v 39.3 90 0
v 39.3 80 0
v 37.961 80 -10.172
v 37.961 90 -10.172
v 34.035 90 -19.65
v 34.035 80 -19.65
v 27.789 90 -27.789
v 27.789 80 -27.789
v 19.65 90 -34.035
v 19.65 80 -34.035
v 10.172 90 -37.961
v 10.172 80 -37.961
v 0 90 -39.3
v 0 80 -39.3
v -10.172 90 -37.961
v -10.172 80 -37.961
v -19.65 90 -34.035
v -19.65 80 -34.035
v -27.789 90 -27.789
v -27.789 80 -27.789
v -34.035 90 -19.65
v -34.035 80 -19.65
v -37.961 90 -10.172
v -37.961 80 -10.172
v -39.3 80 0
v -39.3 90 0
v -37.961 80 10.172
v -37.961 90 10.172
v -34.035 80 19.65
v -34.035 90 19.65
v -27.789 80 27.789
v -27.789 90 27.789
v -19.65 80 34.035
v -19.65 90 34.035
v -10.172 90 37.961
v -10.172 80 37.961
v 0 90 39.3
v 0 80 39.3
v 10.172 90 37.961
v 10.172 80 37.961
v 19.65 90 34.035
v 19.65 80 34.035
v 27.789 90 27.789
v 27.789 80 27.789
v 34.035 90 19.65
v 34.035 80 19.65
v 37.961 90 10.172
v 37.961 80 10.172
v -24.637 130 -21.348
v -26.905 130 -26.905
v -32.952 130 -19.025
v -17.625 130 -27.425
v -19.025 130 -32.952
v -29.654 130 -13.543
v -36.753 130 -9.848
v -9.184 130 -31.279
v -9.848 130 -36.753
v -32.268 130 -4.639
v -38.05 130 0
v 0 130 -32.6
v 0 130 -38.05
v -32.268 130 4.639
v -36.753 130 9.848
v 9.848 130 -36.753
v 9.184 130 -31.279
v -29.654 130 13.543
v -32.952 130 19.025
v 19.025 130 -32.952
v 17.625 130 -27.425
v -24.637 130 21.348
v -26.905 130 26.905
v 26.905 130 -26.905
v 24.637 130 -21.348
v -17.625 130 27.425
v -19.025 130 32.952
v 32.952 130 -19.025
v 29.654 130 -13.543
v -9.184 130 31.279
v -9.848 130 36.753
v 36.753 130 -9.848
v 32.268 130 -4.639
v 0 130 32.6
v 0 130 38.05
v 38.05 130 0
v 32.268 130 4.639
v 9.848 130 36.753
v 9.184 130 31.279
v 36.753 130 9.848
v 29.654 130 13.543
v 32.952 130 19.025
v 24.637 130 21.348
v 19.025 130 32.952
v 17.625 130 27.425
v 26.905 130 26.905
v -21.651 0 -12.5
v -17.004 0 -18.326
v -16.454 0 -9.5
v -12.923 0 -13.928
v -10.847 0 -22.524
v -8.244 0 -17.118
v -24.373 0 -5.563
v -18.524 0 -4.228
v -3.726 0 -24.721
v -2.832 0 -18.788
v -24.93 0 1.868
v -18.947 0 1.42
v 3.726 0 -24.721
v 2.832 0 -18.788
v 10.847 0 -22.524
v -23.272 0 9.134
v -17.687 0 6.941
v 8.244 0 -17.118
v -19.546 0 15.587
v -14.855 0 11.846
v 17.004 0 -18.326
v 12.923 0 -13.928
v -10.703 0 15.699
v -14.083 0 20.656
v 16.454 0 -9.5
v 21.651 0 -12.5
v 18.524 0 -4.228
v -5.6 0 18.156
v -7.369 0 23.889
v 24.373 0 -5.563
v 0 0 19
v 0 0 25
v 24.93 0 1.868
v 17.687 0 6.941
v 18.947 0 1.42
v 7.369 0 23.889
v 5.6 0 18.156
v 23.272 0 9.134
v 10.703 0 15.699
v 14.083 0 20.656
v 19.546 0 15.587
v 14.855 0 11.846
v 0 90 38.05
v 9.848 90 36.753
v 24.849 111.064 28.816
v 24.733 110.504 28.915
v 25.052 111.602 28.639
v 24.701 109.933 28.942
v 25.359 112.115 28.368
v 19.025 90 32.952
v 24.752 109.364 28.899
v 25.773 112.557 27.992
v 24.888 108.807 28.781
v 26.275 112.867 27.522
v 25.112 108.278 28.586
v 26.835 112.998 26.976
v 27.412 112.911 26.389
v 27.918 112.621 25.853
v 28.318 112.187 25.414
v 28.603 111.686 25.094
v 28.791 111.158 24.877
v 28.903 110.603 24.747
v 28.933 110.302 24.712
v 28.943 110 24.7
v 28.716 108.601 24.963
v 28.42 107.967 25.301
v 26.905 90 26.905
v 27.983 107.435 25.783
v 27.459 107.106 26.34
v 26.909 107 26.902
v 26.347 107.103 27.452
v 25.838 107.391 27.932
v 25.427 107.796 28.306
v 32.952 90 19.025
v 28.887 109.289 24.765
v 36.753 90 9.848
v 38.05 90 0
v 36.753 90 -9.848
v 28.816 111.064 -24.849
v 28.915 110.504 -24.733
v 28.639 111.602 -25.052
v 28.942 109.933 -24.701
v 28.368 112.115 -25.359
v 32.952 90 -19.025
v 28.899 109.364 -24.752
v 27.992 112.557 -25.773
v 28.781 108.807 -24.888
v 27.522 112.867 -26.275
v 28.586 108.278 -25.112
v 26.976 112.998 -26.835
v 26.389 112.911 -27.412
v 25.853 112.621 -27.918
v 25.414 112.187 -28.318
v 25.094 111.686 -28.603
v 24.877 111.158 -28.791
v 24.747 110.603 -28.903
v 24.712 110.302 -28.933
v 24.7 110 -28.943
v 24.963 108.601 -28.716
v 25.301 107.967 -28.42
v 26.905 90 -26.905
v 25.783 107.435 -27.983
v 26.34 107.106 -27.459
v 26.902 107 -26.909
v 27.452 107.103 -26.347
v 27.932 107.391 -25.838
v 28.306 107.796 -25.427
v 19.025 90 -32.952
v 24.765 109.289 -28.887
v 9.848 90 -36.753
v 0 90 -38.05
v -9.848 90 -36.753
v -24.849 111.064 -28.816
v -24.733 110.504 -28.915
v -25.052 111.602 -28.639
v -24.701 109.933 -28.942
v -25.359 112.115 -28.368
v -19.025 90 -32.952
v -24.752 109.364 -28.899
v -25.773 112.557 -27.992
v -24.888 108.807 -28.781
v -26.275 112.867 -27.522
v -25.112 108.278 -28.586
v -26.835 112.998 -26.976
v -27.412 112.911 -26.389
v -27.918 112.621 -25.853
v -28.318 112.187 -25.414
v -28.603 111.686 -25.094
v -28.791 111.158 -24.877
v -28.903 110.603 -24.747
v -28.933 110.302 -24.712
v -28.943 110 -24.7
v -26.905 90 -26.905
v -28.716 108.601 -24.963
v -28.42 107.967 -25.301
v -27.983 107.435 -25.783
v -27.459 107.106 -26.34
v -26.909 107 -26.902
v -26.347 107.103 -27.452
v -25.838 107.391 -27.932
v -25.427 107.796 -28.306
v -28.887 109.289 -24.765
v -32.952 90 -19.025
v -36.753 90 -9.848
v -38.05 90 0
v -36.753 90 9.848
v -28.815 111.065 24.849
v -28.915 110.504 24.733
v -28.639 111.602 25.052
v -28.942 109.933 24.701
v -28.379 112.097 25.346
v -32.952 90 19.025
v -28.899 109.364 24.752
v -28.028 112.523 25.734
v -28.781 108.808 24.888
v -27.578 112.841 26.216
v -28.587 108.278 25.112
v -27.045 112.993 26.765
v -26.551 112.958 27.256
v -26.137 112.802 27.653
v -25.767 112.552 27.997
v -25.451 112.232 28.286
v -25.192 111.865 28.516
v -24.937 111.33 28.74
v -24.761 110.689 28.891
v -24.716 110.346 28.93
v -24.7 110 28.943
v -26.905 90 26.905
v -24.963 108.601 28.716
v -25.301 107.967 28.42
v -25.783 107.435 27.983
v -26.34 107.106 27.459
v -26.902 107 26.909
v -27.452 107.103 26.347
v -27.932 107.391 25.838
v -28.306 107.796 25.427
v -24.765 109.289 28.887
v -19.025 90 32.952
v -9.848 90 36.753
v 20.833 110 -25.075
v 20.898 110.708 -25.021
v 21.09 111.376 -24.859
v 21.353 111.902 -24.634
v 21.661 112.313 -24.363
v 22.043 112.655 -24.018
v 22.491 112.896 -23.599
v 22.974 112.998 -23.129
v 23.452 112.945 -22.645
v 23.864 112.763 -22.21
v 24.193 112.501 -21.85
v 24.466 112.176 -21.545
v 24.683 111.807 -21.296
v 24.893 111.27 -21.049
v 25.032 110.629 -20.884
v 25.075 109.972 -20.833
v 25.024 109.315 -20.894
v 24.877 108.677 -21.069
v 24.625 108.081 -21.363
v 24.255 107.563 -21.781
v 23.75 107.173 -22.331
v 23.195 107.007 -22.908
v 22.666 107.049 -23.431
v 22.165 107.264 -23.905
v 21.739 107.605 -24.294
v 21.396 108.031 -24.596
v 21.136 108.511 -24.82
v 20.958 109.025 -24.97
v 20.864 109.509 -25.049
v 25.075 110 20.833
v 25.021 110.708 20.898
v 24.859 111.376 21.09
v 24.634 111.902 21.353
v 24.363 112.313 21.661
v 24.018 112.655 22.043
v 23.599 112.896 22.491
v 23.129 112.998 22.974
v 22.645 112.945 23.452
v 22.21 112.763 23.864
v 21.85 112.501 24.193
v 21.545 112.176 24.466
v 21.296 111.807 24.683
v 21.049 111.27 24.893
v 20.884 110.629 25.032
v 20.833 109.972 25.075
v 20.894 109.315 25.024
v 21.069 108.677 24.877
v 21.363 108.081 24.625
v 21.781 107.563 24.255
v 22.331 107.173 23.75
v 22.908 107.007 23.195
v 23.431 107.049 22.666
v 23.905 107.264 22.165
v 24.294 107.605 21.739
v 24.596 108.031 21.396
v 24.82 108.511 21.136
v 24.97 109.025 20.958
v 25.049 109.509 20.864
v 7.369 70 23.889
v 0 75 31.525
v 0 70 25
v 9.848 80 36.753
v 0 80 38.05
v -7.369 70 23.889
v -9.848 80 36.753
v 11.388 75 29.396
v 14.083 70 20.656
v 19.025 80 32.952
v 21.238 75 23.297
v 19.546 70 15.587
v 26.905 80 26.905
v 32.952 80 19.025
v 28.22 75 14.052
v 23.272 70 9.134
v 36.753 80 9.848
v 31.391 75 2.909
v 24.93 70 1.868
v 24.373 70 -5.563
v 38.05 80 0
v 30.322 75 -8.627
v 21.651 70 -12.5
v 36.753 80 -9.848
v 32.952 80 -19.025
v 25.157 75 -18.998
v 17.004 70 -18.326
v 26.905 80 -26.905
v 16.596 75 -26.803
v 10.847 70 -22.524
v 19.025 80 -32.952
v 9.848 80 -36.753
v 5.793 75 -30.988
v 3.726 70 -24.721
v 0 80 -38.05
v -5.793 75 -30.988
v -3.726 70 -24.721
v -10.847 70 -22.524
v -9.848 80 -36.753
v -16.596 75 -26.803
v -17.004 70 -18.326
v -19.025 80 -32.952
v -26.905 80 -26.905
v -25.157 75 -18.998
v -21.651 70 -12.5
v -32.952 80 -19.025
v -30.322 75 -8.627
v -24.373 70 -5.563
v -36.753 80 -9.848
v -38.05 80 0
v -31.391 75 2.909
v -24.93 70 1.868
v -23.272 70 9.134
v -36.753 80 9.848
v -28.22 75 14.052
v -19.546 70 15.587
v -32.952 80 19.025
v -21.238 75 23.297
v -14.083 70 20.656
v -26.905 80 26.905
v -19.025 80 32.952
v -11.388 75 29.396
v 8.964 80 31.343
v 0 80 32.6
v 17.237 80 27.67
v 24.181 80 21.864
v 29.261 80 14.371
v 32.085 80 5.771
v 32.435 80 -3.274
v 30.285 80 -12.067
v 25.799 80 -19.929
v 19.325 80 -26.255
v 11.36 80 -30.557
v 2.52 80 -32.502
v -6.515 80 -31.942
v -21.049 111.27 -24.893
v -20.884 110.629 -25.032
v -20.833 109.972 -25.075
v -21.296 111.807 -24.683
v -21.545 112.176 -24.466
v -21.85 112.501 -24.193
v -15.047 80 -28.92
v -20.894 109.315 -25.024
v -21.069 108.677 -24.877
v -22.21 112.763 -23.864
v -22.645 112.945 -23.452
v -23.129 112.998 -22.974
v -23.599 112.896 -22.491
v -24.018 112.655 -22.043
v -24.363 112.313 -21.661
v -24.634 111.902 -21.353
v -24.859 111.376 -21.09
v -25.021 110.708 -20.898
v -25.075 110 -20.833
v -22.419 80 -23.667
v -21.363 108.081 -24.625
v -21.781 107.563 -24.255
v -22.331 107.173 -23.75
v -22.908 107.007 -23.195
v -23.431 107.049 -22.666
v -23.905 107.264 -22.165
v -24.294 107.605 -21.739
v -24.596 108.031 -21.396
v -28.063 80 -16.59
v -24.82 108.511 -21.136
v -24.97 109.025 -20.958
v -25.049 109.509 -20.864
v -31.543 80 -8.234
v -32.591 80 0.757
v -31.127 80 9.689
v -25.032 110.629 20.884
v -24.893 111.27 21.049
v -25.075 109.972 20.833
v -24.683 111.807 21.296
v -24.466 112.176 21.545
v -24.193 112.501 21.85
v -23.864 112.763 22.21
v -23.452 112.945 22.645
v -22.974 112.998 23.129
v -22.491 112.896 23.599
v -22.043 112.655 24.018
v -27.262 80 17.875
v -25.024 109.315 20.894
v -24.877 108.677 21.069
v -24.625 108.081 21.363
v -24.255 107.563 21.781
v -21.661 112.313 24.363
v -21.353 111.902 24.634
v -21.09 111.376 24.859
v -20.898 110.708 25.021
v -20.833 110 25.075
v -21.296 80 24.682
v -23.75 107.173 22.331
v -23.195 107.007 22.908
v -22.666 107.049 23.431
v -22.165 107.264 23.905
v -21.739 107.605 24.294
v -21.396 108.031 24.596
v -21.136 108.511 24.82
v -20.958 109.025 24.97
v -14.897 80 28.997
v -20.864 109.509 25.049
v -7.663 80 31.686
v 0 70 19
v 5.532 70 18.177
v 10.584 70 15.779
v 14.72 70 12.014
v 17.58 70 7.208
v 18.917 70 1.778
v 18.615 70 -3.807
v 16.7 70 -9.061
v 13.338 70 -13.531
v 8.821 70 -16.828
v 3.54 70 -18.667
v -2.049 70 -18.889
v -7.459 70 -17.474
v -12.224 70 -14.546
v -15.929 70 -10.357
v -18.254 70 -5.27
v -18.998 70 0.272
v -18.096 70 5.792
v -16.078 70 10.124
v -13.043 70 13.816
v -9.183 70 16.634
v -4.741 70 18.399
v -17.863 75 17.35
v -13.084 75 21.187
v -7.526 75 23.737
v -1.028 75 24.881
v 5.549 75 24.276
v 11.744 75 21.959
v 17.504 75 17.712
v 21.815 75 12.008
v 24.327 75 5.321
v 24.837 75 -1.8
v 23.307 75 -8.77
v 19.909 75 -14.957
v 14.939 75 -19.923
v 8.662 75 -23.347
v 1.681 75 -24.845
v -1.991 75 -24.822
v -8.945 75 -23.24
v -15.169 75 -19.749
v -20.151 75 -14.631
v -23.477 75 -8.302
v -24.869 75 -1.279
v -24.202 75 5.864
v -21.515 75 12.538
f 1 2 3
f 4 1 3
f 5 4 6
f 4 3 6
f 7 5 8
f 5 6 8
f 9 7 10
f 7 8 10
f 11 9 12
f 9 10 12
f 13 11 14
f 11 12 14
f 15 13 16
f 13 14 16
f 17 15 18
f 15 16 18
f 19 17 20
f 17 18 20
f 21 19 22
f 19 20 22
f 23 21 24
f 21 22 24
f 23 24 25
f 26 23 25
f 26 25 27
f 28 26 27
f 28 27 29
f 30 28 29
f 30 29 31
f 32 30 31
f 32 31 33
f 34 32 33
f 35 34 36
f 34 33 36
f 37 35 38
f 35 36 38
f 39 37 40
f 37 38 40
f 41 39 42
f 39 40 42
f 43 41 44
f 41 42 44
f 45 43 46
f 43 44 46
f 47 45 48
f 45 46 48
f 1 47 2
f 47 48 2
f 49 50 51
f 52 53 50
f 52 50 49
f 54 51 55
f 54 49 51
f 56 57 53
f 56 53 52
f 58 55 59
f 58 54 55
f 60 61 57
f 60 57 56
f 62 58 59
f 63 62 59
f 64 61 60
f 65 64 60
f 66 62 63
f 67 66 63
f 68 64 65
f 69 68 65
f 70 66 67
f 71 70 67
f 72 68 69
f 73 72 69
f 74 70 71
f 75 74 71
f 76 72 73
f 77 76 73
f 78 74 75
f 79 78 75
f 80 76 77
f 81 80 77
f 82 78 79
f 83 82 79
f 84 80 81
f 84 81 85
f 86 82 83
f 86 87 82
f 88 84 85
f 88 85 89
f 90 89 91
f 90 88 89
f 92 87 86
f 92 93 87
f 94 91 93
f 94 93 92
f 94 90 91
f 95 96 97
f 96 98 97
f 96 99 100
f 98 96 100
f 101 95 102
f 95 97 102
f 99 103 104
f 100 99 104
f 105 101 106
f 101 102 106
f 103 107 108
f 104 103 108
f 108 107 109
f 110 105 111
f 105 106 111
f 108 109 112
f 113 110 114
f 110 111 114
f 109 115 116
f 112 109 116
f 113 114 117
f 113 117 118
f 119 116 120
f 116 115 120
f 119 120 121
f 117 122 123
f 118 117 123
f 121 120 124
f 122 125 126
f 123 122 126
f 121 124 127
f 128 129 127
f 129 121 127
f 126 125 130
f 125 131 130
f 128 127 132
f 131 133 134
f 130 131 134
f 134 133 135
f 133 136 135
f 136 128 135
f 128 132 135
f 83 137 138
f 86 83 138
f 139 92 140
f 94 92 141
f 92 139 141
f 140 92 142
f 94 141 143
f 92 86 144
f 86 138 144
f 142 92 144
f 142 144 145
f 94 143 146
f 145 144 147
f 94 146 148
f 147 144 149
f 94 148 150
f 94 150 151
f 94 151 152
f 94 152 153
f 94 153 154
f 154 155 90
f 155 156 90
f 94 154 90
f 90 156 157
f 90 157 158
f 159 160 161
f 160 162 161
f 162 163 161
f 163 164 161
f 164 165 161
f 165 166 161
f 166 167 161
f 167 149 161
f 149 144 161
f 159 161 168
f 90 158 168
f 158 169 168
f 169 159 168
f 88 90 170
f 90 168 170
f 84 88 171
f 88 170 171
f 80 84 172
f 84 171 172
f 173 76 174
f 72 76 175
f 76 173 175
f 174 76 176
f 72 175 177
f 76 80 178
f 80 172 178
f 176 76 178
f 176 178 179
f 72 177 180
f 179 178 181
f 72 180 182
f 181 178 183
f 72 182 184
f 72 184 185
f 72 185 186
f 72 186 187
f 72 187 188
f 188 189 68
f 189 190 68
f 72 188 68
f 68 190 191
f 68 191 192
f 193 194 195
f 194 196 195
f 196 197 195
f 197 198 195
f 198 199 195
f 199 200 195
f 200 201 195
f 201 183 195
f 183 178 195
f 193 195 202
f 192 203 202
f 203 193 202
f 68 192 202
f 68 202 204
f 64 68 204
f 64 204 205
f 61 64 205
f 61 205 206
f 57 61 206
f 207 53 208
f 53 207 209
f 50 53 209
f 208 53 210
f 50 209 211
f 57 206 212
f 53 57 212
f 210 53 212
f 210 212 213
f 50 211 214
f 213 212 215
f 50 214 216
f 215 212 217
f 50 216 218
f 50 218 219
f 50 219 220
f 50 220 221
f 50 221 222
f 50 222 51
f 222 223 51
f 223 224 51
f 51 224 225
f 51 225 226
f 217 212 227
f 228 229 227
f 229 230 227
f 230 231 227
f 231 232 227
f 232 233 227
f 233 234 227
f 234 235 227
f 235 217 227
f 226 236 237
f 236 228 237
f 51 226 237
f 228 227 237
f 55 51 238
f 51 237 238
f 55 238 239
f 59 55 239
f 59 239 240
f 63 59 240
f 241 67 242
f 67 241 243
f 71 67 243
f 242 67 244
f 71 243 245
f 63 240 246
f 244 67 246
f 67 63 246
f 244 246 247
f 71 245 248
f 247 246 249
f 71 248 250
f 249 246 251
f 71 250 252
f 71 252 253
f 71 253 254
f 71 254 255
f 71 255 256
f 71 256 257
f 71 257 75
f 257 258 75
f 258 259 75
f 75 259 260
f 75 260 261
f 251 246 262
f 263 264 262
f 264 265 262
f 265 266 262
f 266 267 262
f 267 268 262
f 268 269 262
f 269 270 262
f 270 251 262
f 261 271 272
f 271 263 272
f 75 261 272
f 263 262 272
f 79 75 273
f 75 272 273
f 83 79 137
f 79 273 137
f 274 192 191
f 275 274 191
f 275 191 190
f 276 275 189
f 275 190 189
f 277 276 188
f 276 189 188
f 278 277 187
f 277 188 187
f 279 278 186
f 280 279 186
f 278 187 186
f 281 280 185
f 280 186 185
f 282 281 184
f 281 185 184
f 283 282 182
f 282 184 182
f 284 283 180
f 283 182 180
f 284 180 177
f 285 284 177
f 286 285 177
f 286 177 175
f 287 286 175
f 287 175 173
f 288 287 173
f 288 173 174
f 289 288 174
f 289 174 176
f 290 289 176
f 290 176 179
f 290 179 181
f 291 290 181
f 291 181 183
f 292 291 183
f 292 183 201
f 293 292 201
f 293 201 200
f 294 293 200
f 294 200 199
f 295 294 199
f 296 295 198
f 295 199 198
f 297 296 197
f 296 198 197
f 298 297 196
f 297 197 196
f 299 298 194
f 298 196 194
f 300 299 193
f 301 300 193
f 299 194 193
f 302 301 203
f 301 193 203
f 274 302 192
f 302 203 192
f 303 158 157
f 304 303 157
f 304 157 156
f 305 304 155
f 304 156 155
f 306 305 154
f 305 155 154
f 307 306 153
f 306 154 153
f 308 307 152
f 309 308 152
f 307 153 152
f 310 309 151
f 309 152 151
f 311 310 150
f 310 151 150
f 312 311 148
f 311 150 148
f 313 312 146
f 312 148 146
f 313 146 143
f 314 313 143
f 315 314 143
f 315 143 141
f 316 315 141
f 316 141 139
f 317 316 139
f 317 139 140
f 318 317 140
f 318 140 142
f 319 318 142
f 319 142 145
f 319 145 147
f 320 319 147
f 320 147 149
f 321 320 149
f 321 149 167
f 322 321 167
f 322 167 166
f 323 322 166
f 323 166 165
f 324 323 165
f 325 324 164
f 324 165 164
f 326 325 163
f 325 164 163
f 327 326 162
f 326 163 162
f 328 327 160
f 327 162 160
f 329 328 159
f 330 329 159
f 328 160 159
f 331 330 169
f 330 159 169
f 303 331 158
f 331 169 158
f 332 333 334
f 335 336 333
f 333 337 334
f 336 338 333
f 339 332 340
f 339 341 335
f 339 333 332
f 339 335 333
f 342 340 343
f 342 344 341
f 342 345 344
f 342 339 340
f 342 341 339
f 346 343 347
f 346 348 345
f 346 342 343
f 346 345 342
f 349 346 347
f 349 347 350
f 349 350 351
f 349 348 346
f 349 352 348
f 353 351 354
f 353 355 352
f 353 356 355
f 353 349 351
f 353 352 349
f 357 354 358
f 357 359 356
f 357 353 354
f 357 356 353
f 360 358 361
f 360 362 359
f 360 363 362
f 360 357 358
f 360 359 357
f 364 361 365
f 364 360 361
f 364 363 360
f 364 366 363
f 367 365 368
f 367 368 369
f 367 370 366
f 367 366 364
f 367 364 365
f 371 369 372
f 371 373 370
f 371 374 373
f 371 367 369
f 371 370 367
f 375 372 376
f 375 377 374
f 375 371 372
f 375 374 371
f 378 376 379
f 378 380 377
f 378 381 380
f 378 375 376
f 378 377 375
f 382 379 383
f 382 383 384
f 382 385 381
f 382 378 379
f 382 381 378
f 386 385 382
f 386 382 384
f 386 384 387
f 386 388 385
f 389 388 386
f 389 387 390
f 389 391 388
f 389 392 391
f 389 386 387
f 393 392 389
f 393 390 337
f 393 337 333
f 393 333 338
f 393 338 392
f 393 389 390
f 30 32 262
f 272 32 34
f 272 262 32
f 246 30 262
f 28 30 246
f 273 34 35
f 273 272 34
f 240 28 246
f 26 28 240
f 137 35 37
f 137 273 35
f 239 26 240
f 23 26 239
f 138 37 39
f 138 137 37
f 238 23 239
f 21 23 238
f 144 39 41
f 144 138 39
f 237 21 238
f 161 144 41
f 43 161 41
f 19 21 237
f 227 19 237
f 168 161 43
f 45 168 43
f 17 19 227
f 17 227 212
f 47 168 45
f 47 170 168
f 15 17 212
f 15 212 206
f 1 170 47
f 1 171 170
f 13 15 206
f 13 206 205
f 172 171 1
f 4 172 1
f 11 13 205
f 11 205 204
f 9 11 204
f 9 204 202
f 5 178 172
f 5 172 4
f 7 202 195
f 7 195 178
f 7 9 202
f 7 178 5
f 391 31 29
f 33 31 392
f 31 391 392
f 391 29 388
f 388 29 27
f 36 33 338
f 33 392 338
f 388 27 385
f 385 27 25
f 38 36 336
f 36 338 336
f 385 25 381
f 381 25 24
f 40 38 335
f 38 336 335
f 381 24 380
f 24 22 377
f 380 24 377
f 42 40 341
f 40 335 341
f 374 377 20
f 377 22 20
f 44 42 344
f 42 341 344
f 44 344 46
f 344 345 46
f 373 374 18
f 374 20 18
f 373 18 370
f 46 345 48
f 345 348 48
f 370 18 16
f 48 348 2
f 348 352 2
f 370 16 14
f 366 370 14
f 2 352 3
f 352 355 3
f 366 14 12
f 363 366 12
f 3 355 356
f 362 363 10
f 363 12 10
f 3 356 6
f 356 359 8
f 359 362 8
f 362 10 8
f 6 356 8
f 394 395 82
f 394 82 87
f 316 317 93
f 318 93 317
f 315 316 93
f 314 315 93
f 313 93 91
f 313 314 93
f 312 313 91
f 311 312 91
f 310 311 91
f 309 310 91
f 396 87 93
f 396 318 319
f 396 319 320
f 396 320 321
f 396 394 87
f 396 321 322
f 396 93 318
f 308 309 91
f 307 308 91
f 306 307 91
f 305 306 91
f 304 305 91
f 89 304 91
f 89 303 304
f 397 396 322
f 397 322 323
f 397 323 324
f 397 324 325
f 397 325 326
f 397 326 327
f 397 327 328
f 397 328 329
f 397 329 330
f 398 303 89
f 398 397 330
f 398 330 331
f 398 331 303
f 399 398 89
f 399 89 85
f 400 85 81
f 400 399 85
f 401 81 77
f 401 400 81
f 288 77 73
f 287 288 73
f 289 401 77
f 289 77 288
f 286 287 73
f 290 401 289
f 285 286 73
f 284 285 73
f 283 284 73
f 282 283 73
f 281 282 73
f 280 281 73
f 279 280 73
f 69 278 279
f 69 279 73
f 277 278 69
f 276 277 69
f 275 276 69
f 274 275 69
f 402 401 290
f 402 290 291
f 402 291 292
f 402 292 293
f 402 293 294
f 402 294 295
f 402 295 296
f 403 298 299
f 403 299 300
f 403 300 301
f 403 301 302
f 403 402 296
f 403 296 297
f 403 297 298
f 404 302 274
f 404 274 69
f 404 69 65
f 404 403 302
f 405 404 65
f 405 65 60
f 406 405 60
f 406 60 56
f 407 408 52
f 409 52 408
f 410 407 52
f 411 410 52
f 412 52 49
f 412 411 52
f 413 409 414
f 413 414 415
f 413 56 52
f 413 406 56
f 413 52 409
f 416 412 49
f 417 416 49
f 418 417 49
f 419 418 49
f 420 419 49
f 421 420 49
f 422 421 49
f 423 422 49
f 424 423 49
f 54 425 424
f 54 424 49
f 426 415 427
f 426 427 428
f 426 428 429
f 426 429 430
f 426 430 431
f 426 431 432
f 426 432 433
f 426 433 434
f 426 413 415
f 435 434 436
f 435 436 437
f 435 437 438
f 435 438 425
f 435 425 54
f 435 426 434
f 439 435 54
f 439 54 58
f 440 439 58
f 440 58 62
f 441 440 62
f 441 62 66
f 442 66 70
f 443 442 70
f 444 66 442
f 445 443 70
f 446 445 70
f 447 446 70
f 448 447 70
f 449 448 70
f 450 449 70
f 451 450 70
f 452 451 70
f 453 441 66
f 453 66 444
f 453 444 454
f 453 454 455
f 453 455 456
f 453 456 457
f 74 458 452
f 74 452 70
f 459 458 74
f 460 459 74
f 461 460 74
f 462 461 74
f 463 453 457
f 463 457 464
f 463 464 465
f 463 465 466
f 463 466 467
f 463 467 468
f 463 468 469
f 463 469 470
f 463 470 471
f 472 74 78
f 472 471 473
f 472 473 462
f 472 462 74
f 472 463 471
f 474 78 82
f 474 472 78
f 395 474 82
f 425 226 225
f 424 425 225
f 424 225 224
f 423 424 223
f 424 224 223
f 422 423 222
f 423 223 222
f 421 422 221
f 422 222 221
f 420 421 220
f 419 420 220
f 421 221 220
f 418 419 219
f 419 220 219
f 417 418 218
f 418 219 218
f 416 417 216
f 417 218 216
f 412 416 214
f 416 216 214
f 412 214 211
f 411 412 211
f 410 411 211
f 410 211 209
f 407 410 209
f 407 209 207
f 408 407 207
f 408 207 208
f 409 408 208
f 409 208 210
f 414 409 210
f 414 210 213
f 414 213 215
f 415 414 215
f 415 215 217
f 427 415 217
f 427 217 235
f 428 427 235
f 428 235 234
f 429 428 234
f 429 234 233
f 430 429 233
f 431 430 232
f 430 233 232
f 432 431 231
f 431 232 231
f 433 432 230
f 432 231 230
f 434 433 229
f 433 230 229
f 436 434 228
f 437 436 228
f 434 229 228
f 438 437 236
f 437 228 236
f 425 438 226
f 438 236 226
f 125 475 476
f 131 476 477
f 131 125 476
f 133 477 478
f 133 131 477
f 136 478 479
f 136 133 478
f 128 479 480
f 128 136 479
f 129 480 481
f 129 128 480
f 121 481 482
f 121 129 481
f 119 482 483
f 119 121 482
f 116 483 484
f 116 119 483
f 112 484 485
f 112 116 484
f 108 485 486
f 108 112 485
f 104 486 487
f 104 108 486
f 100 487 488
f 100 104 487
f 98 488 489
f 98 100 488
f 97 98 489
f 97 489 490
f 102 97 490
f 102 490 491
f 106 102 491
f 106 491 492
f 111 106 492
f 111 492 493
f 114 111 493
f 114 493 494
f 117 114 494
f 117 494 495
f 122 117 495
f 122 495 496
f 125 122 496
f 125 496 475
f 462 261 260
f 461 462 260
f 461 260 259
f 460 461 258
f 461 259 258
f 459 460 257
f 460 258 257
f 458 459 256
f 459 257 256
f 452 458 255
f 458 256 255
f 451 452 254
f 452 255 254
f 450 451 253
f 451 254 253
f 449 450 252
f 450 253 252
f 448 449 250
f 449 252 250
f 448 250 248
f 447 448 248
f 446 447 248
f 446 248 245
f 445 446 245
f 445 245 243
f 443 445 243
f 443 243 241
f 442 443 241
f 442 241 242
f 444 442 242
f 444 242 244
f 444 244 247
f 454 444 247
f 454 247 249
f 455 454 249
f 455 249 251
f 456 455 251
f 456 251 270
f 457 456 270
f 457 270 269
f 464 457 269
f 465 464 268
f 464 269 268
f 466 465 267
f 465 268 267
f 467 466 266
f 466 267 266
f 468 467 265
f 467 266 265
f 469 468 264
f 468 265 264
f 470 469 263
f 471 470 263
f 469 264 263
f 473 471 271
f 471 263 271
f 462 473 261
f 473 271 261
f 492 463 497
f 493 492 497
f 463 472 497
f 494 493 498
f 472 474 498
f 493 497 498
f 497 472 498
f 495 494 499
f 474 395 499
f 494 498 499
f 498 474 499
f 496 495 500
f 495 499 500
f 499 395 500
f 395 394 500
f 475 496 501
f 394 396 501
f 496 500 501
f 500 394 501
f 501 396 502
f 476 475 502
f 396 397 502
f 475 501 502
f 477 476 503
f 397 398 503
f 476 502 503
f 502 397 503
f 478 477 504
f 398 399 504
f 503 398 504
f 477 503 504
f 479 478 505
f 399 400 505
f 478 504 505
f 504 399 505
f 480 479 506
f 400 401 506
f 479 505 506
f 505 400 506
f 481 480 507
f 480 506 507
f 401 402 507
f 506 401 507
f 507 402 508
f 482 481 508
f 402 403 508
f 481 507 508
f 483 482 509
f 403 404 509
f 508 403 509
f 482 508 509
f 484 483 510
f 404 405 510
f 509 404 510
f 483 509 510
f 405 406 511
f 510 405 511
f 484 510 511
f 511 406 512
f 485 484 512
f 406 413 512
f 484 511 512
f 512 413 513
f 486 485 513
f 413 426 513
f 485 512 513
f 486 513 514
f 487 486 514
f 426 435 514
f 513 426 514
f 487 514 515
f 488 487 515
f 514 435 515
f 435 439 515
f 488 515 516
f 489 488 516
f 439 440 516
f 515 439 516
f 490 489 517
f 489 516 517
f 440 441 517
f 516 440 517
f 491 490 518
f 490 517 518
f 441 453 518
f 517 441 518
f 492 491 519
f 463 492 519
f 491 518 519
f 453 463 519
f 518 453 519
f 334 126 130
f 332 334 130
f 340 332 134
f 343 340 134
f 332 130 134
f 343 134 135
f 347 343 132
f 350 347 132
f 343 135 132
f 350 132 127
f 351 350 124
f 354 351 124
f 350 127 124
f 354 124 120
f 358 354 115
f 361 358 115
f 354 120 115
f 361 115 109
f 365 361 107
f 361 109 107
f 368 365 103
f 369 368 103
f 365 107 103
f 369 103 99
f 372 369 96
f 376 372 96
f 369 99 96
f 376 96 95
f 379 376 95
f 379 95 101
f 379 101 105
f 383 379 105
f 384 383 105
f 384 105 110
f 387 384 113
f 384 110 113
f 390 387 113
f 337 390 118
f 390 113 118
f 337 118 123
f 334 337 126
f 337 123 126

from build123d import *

# Parameters (mm, degrees)
SKETCH2_R                 = 25
SKETCH2_R_2               = 19
BOSS_EXTRUDE1_DEPTH       = 70
BOSS_EXTRUDE2_START       = 10
SKETCH3_R                 = 38.05
SKETCH3_R_2               = 32.6
BOSS_EXTRUDE2_DEPTH       = 50
BOSS_EXTRUDE3_START       = -50
BOSS_EXTRUDE3_OUTLINE_R   = 39.3
BOSS_EXTRUDE3_OUTLINE_R_2 = 38.05
BOSS_EXTRUDE3_DEPTH       = 10
CUT_EXTRUDE1_REACH        = 162.207
CUT_EXTRUDE1_END_RADIUS   = 32.6
SKETCH7_R                 = 3
CIRPATTERN1_COUNT         = 4


with BuildPart() as part:
    # Sketch2 → Boss-Extrude1 (new body)
    with BuildSketch(Plane(origin=(0, 0, 0), x_dir=(1, 0, 0), z_dir=(0, 1, 0))):
        with Locations(Location((0, 0, 0), (0, 0, 270))):
            Circle(SKETCH2_R)
        with Locations(Location((0, 0, 0), (0, 0, 270))):
            Circle(SKETCH2_R_2, mode=Mode.SUBTRACT)
    extrude(amount=BOSS_EXTRUDE1_DEPTH)



with BuildPart() as body_2:
    # Sketch3 → Boss-Extrude2 (new body)
    with BuildSketch(Plane(origin=(0, 70, 0), x_dir=(1, 0, 0), z_dir=(0, 1, 0)).offset(BOSS_EXTRUDE2_START)):
        with Locations(Location((0, 0, 0), (0, 0, 270))):
            Circle(SKETCH3_R)
        with Locations(Location((0, 0, 0), (0, 0, 270))):
            Circle(SKETCH3_R_2, mode=Mode.SUBTRACT)
    extrude(amount=BOSS_EXTRUDE2_DEPTH)


with BuildPart() as part_1:
    add(part.part)

    add(body_2.part)  # loft3 joins it to this body
    # loft up to a face of the part (loft3)
    loft([Face(Wire([part_1.edges().sort_by_distance((18.224215686, 70, -17.113677648))[0]])), Face(Wire([part_1.edges().sort_by_distance((-27.737256273, 80, -26.047017381))[0]]))])

    # Cut-Loft1: read off the stored shape, not the designer's step
    # Cut-Loft1: loft between two sections, ruled curve by curve
    cut_loft1_from = [
        Edge.make_bspline([(-18.095722376, 70, 5.791790025), (-6.512142325, 70, 41.983234777), (29.679302426, 70, 30.399654727), (18.095722376, 70, -5.791790025), (6.512142325, 70, -41.983234777), (-29.679302426, 70, -30.399654727), (-18.095722376, 70, 5.791790025)], [0, 0, 0, 0, 0.5, 0.5, 0.5, 1, 1, 1, 1], 3, [1, 0.333333333, 0.333333333, 1, 0.333333333, 0.333333333, 1]),
    ]
    cut_loft1_to = [
        Edge.make_bspline([(-21.296342667, 80, 24.682499651), (28.068656636, 80, 67.275184984), (70.661341969, 80, 17.910185682), (21.296342667, 80, -24.682499651), (-28.068656636, 80, -67.275184984), (-70.661341969, 80, -17.910185682), (-21.296342667, 80, 24.682499651)], [0, 0, 0, 0, 0.5, 0.5, 0.5, 1, 1, 1, 1], 3, [1, 0.333333333, 0.333333333, 1, 0.333333333, 0.333333333, 1]),
    ]
    cut_loft1 = Solid(Shell([*[Face.make_surface_from_curves(cut_loft1_from[k], cut_loft1_to[k]) for k in range(1)], Face(Wire(cut_loft1_from)), Face(Wire(cut_loft1_to))]))
    add(cut_loft1, mode=Mode.SUBTRACT)

    # Boss-Extrude3: read off the stored shape, not the designer's step
    # Boss-Extrude3 outline → Boss-Extrude3 (add)
    with BuildSketch(Plane(origin=(0, 130, 0), x_dir=(1, 0, 0), z_dir=(0, 1, 0)).offset(BOSS_EXTRUDE3_START)):
        Circle(BOSS_EXTRUDE3_OUTLINE_R)
        Circle(BOSS_EXTRUDE3_OUTLINE_R_2, mode=Mode.SUBTRACT)
    extrude(amount=BOSS_EXTRUDE3_DEPTH)

    # Cut-Extrude1: up to this cylinder (the profile starts outside it)
    cut_extrude1_end = Plane(origin=(0, 110, 0), z_dir=(0, -1, 0)) * Cylinder(CUT_EXTRUDE1_END_RADIUS, 390.614, mode=Mode.PRIVATE)
    # Sketch7 → Cut-Extrude1 (cut, up to the surface)
    with BuildSketch(Plane(origin=(-26.905413024, 0, 26.905413024), x_dir=(0, -1, 0), z_dir=(-0.7071067811865488, 0, 0.7071067811865464)), mode=Mode.PRIVATE) as cut_extrude1_sk1:
        with Locations(Location((-110, 0, 0), (0, 0, 90))):
            Circle(SKETCH7_R)
    cut_extrude1_tool1 = extrude(cut_extrude1_sk1.sketch, amount=-CUT_EXTRUDE1_REACH, mode=Mode.PRIVATE) - cut_extrude1_end
    cut_extrude1 = cut_extrude1_tool1.solids().sort_by_distance((-26.905413, 110, 26.905413))[0]
    add(cut_extrude1, mode=Mode.SUBTRACT)

    # CirPattern1: Cut-Extrude1 ×4 about axis
    cirpattern1_axis = Axis((0, 130, 0), (0, -1, 0))
    for i in range(1, CIRPATTERN1_COUNT):
        add(cut_extrude1.rotate(cirpattern1_axis, i * 360 / CIRPATTERN1_COUNT), mode=Mode.SUBTRACT)


solid = part_1.part
